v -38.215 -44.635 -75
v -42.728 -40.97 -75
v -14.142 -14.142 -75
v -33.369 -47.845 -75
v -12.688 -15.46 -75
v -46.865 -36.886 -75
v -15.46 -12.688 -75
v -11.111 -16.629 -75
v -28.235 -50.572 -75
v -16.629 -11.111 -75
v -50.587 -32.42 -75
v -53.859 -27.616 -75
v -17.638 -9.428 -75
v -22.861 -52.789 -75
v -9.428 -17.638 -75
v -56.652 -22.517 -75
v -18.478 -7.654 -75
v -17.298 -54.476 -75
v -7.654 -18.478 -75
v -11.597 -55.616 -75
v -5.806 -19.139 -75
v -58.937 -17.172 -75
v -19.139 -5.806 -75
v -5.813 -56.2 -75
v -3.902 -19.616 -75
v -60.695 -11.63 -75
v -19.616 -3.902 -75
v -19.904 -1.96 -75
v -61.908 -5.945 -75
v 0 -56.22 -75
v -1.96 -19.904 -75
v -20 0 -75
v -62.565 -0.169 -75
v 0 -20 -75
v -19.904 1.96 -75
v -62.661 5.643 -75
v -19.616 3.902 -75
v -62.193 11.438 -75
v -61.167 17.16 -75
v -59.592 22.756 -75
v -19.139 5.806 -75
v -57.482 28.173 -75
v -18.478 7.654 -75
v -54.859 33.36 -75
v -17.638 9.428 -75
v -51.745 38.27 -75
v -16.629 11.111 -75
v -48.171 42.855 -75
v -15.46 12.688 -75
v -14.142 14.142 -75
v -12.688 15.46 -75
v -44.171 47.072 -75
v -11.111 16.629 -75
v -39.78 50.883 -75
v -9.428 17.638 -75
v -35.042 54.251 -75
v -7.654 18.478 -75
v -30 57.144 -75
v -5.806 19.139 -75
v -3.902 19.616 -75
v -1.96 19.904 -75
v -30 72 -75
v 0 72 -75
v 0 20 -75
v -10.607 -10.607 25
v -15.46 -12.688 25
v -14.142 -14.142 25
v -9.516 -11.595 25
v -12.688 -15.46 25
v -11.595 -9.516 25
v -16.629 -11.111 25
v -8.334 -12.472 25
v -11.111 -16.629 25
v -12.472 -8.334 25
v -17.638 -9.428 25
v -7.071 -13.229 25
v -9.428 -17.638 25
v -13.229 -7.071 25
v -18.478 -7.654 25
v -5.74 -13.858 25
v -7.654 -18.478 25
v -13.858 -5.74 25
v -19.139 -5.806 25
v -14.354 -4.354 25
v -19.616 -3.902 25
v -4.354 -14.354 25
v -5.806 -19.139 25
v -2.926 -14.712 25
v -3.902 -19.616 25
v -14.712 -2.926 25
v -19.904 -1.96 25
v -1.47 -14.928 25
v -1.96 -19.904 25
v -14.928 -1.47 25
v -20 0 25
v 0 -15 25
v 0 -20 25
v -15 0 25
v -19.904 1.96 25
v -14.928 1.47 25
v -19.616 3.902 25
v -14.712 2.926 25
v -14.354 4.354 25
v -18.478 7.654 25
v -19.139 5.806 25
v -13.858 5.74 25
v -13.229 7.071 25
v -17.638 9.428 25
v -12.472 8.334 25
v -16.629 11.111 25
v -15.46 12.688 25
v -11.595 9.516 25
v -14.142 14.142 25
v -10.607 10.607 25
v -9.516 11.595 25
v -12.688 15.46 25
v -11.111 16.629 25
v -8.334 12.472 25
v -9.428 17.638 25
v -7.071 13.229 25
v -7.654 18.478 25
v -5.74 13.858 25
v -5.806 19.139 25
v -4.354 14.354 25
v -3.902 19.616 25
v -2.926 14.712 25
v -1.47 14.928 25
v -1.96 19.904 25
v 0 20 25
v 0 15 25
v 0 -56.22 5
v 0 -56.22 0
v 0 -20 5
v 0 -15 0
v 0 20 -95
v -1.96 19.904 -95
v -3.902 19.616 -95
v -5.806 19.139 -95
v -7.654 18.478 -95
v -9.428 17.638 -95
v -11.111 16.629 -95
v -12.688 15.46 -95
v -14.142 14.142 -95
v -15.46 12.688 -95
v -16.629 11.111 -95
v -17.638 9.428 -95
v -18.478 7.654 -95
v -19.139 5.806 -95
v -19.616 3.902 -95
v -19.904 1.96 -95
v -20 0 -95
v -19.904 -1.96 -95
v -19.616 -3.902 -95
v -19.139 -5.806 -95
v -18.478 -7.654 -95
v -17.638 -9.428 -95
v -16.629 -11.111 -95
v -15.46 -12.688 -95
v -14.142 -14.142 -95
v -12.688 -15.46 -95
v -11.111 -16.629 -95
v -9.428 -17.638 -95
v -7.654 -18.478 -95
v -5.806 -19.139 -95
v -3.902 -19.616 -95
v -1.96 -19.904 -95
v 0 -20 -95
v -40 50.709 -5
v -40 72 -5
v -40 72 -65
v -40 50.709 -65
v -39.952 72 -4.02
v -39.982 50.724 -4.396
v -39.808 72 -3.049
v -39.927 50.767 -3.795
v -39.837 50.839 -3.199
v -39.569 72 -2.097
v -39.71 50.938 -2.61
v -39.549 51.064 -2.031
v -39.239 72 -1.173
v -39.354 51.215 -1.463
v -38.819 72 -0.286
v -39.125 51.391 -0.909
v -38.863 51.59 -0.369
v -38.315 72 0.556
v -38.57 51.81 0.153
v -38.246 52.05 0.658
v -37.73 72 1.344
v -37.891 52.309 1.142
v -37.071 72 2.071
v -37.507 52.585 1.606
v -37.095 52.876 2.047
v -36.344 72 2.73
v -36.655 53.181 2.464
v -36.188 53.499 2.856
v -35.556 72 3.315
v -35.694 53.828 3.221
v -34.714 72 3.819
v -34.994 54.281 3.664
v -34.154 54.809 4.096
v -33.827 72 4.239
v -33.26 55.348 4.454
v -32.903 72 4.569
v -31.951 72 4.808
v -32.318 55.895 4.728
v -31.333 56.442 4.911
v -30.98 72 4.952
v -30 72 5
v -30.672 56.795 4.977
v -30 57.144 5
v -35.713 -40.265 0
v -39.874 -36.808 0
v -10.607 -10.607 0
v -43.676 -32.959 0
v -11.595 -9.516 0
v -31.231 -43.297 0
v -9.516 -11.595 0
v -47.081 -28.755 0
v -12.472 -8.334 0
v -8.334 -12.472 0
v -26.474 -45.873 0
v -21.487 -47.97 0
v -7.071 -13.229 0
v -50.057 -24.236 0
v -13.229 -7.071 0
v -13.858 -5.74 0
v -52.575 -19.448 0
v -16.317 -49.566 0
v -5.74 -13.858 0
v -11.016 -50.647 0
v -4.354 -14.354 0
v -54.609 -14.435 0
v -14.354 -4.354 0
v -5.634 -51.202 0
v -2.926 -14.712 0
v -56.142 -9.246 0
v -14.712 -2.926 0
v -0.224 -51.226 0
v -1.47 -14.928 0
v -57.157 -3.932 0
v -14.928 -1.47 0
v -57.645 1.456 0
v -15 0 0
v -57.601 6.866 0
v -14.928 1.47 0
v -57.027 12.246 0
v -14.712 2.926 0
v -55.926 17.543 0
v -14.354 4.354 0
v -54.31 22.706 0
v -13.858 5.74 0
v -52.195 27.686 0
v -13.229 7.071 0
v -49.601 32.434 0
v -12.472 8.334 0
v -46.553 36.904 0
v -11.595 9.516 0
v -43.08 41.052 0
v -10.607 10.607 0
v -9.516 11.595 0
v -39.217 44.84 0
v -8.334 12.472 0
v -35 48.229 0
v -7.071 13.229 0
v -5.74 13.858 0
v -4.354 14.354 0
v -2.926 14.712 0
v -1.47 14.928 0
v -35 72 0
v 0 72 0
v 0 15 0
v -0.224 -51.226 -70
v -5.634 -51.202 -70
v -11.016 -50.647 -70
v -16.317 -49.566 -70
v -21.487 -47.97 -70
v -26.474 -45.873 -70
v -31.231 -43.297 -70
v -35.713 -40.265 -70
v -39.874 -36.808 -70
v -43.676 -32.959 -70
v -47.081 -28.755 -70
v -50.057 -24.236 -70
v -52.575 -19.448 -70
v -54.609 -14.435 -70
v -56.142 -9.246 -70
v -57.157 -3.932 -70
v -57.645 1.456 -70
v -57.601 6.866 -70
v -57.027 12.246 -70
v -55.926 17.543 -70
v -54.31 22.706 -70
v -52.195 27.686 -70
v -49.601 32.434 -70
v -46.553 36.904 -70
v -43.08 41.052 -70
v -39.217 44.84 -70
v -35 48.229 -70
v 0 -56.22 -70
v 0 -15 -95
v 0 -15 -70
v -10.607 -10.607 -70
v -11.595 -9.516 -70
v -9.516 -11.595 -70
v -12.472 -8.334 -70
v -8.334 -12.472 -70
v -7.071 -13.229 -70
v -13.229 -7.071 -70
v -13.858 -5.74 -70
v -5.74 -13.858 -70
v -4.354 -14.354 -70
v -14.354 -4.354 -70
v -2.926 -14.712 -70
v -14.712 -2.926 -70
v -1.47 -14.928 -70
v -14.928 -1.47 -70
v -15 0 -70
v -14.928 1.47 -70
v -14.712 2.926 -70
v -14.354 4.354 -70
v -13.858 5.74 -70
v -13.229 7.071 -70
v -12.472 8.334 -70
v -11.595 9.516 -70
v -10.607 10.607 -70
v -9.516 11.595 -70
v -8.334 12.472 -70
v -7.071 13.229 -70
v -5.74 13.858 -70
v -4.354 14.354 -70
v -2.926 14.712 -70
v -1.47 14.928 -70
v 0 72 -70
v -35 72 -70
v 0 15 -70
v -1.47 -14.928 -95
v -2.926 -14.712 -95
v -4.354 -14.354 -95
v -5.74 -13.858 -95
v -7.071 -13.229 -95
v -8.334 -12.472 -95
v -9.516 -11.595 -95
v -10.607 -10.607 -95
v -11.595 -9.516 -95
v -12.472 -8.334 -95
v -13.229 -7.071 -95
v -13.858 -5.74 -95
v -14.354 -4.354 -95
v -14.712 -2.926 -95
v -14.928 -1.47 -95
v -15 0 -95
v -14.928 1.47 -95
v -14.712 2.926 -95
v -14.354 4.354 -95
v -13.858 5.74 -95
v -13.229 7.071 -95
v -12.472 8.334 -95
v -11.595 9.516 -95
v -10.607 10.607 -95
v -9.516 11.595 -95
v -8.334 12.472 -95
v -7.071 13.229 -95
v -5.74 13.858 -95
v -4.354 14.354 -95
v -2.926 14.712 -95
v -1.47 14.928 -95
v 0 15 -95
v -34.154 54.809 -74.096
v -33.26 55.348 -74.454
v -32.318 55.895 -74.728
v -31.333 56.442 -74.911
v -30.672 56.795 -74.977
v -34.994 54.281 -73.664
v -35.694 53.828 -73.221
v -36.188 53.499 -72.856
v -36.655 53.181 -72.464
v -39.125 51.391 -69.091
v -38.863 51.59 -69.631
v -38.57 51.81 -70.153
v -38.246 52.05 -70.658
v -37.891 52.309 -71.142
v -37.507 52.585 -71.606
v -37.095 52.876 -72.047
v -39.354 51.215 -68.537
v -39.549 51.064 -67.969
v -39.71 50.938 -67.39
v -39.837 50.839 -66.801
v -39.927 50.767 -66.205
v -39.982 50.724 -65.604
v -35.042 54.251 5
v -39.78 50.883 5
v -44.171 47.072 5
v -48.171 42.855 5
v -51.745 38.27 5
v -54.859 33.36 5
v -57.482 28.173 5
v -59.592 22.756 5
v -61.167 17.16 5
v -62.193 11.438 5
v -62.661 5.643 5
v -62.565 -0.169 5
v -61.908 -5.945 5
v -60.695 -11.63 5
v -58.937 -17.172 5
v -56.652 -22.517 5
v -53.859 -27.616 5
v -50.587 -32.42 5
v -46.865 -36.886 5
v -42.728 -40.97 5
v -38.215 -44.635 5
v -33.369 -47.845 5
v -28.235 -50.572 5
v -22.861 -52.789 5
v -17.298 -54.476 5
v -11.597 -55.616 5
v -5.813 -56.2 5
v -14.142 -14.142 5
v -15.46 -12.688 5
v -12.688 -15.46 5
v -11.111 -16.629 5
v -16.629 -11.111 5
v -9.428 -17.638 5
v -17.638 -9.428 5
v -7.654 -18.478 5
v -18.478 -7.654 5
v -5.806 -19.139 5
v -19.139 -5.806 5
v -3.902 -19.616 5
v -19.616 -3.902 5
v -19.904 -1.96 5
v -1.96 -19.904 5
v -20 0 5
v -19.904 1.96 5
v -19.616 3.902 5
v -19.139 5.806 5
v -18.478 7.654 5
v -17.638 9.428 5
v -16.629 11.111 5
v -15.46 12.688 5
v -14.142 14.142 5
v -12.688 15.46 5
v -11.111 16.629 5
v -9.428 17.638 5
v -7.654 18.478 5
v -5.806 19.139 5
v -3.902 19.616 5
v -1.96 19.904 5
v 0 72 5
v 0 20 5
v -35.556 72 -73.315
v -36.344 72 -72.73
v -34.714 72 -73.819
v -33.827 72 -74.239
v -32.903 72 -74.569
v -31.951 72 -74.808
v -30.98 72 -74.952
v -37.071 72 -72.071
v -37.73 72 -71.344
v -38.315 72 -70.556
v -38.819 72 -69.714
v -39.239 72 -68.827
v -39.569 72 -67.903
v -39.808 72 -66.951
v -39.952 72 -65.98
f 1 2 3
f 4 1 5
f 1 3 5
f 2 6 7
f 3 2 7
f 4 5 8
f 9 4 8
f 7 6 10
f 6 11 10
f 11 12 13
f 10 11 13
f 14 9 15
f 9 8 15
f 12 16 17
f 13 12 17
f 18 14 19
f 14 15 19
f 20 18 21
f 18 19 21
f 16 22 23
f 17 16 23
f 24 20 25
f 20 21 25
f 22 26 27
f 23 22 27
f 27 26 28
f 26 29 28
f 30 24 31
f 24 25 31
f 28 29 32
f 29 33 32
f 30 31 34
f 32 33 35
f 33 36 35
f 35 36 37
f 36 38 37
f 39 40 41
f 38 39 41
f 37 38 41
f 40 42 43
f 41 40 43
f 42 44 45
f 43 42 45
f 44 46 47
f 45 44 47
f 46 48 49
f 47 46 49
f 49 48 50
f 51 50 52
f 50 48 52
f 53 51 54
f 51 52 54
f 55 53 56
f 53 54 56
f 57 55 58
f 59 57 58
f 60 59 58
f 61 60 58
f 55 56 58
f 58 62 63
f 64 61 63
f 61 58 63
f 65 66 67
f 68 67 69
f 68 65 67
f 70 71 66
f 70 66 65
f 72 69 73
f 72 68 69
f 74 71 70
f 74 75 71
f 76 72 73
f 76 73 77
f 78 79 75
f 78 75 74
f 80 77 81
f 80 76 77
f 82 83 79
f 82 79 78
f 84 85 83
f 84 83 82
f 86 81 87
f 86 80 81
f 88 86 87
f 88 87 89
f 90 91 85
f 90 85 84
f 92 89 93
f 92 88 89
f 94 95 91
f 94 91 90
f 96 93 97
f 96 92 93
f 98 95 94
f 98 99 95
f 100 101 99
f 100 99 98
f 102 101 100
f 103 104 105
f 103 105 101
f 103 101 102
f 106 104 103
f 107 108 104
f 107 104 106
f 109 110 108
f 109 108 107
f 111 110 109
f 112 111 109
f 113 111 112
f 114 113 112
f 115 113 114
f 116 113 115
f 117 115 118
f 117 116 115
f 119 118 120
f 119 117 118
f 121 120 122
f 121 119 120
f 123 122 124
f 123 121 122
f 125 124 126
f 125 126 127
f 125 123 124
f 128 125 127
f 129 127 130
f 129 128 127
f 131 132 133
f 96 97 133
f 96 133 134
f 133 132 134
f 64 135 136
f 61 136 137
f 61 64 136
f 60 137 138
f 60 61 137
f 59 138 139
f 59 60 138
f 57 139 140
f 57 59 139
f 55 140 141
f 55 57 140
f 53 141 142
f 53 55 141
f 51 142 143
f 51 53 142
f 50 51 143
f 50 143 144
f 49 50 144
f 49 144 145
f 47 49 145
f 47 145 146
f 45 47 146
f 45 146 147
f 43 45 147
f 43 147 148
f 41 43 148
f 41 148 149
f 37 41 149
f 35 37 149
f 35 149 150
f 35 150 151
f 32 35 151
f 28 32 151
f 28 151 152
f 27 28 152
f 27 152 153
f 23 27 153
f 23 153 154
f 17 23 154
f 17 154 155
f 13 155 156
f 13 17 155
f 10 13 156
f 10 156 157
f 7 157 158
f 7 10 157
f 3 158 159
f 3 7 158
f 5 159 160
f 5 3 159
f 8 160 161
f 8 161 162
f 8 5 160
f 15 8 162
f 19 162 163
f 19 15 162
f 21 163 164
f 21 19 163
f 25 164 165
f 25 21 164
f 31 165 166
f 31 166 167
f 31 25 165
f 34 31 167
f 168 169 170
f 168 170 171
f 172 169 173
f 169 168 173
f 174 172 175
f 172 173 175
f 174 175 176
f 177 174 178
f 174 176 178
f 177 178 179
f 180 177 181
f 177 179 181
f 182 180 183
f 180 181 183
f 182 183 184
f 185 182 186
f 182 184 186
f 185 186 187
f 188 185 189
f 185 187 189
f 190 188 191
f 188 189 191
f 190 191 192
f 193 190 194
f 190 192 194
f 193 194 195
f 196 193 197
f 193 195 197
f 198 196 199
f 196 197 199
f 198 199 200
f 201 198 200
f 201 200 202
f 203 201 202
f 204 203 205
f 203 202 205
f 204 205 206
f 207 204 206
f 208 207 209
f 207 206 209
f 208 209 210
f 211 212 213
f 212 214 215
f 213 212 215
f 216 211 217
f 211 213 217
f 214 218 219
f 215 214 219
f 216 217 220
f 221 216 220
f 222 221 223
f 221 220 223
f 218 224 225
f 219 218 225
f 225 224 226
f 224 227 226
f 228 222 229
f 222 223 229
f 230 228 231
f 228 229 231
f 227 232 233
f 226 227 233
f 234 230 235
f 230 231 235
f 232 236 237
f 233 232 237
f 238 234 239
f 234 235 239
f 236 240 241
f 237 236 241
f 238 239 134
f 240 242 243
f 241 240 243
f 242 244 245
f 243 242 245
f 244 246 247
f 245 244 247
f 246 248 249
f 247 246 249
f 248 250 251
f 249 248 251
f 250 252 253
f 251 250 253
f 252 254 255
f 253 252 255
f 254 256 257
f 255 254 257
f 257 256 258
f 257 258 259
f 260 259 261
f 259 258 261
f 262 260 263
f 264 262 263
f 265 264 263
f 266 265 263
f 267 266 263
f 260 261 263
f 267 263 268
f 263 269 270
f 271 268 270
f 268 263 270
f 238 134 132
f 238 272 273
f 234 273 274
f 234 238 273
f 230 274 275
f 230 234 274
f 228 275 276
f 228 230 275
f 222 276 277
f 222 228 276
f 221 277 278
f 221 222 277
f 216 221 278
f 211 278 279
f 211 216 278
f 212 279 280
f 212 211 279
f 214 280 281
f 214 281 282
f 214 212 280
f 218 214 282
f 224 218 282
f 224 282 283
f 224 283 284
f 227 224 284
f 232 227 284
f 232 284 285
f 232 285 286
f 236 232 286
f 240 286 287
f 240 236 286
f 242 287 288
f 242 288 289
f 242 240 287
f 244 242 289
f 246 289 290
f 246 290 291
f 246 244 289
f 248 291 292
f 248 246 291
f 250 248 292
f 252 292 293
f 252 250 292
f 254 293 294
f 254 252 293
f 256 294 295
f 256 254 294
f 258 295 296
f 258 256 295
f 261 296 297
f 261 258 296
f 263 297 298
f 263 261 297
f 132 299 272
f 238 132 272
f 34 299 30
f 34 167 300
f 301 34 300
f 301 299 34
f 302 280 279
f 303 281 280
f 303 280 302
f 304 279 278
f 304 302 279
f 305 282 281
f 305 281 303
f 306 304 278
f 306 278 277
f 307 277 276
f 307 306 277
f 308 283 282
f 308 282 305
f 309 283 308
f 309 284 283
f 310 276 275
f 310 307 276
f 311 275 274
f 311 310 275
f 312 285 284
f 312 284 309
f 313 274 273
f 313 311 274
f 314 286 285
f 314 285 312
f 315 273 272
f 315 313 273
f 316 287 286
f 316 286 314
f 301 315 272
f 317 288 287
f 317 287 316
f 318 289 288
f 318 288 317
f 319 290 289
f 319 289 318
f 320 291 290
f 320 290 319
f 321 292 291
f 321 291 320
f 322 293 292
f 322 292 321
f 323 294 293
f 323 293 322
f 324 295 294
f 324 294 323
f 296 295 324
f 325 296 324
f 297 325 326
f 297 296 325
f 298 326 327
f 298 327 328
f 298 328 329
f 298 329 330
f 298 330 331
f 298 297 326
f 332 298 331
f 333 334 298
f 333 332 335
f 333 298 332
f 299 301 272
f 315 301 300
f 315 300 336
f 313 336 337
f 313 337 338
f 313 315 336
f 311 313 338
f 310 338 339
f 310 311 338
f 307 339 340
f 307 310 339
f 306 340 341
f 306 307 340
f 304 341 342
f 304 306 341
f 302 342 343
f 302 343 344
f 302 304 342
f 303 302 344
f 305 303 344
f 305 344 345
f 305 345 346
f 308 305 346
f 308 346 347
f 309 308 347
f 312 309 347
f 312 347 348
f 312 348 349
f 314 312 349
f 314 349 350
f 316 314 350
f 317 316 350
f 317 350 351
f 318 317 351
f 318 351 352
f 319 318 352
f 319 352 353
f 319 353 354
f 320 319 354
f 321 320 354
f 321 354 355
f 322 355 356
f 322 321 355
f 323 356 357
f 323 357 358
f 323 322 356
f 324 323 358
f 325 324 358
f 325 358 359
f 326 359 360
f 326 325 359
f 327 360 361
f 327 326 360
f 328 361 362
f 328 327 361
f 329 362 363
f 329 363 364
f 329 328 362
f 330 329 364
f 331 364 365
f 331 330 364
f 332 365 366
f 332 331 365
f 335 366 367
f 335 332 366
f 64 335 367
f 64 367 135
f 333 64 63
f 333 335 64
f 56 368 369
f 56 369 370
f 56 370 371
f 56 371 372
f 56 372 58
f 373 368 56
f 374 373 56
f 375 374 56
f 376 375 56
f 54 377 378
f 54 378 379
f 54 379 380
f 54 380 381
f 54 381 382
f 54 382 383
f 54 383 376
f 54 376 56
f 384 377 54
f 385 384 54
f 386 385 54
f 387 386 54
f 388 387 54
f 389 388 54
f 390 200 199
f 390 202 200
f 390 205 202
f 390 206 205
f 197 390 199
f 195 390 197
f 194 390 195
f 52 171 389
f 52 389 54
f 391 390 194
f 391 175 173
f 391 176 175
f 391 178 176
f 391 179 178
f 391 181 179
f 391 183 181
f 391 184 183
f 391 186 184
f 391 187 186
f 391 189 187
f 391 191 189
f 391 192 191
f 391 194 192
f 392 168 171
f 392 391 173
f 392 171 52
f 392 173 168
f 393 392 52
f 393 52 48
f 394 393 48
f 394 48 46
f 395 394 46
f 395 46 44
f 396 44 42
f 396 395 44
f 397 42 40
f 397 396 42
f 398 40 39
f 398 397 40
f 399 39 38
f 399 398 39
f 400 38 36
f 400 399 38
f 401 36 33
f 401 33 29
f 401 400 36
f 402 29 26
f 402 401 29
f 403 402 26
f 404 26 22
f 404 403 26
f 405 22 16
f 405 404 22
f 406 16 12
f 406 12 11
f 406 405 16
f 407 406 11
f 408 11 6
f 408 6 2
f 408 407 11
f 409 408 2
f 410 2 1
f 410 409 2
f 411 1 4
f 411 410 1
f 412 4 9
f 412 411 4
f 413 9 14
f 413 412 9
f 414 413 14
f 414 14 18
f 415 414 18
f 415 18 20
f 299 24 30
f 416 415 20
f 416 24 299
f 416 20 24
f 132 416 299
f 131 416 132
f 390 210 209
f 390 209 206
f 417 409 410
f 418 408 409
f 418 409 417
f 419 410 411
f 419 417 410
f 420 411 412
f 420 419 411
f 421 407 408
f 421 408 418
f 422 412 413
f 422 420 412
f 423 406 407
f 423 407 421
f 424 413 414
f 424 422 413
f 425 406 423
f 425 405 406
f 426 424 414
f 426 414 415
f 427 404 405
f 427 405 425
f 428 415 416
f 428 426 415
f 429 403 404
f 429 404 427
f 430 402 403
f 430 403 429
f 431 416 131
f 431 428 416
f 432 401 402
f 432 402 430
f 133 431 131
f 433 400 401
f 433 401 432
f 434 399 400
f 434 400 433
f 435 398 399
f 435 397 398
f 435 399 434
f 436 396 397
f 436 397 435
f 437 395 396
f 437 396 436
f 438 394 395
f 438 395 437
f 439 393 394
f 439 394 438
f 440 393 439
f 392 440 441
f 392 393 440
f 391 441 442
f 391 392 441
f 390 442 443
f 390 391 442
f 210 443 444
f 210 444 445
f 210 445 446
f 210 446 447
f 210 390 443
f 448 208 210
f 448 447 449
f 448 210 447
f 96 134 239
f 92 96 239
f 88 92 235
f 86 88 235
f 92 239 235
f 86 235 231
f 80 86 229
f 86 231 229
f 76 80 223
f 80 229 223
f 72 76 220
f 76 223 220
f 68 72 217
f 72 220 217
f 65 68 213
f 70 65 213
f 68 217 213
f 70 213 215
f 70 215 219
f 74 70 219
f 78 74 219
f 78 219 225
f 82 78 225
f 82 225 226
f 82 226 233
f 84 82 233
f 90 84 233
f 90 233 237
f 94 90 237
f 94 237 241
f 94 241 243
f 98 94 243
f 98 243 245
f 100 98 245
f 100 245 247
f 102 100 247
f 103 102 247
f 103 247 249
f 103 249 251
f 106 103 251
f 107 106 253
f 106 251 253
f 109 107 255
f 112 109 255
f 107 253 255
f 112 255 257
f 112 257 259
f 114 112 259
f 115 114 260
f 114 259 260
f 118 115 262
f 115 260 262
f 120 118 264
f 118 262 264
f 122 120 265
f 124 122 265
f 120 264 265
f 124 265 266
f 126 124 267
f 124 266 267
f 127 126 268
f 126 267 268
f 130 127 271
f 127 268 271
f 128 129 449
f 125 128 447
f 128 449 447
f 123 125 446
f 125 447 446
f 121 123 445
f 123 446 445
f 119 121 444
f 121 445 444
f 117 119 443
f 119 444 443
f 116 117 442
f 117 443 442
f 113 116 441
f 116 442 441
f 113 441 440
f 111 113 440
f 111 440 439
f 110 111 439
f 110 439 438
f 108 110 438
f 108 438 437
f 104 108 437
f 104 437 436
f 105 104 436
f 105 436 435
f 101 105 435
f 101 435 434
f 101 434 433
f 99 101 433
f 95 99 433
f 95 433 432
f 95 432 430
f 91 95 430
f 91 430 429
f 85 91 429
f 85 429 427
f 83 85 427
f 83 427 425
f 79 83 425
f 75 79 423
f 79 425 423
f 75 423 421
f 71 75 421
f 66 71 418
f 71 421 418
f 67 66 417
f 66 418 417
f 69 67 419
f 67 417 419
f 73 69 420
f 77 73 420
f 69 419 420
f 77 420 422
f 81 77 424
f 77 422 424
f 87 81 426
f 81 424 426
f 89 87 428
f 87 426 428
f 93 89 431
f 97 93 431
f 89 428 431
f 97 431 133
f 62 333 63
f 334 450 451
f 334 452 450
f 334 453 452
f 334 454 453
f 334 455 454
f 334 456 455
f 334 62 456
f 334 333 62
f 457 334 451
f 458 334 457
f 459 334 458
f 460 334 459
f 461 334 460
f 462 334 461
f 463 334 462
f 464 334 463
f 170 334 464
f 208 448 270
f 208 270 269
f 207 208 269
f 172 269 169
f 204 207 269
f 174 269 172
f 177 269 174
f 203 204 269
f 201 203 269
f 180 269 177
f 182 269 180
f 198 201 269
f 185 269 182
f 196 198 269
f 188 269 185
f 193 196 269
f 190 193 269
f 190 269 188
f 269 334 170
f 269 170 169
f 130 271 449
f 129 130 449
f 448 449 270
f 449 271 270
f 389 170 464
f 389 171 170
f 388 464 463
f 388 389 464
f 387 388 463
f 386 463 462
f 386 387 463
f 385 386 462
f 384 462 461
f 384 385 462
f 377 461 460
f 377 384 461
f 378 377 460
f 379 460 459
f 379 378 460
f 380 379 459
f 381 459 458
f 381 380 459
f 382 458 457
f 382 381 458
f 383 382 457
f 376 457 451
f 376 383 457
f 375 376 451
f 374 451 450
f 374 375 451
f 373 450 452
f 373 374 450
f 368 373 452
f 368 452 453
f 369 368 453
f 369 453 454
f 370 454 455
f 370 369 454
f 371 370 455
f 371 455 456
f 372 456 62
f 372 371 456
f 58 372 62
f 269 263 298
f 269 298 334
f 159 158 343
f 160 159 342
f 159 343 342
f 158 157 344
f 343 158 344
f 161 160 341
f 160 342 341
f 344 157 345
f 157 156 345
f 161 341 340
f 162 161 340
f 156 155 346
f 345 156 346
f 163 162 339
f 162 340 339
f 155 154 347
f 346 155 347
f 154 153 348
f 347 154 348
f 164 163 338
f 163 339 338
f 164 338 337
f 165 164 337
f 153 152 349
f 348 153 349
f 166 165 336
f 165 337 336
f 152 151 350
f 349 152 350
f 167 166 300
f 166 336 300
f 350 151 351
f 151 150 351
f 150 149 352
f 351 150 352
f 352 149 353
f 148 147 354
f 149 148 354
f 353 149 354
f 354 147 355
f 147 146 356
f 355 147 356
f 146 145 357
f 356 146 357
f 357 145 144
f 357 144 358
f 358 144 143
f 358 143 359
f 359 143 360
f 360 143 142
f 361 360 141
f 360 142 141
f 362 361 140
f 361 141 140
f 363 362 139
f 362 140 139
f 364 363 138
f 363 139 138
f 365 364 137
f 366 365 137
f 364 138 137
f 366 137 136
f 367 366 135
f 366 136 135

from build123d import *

# Parameters (mm, degrees)
DODANIE_WYCI_GNI_CIE1_DEPTH       = 25
DODANIE_WYCI_GNI_CIE2_DEPTH       = 5
WYCI_GNI_CIE_CIENKA_CIANKA1_DEPTH = 70
ZAOKR_GLENIE1_R                   = 10


with BuildPart() as part:
    # Szkic1 → Dodanie-wyciągnięcie1 (new body)
    with BuildSketch(Plane.XY):
        with BuildLine():
            Line((0, 15), (0, 20))
            ThreePointArc((0, 20), (-20, 0), (0, -20))
            Line((0, -20), (0, -15))
            ThreePointArc((0, -15), (-15, 0), (0, 15))
        make_face()
    extrude(amount=DODANIE_WYCI_GNI_CIE1_DEPTH)

    # Szkic2 → Dodanie-wyciągnięcie2 (add)
    with BuildSketch(Plane.XY):
        with BuildLine():
            Line((0, 20), (0, 72))
            Line((0, 72), (-40, 72))
            Line((-40, 72), (-40, 50.70936694))
            ThreePointArc((-40, 50.70936694), (-58.888387013, -17.302808514), (0, -56.220478651))
            Line((0, -56.220478651), (0, -20))
            Line((0, -20), (0, -15))
            ThreePointArc((0, -15), (-15, 0), (0, 15))
            Line((0, 15), (0, 20))
        make_face()
    extrude(amount=DODANIE_WYCI_GNI_CIE2_DEPTH)


with BuildPart() as body_2:
    # Lustro4: mirrored copy
    add(part.part.mirror(Plane(origin=(0, 0, -35), x_dir=(1, 0, 0), z_dir=(0, 0, -1))))


with BuildPart() as part_1:
    add(part.part)

    add(body_2.part)  # Wyciągnięcie-cienka ścianka1 merges body 2
    # Szkic14 → Wyciągnięcie-cienka ścianka1 (add)
    with BuildSketch(Plane(origin=(0, 0, 0), x_dir=(-1, 0, 0), z_dir=(0, 0, -1))):
        with BuildLine():
            Line((40, 72), (40, 50.70936694))
            ThreePointArc((40, 50.70936694), (58.888387013, -17.302808514), (0, -56.220478651))
            Line((0, -56.220478651), (0.224300204, -51.225512243))
            ThreePointArc((0.224300204, -51.225512243), (54.609267077, -14.434561812), (35, 48.229425454))
            Line((35, 48.229425454), (35, 72))
            Line((35, 72), (40, 72))
        make_face()
    extrude(amount=WYCI_GNI_CIE_CIENKA_CIANKA1_DEPTH)

    # Zaokrąglenie1
    zaokr_glenie1_edges = [part_1.edges().sort_by_distance(p)[0] for p in [
        (-40, 61.35468347, 5),
        (-40, 61.35468347, -75),
    ]]
    fillet(zaokr_glenie1_edges, radius=ZAOKR_GLENIE1_R)


solid = part_1.part
